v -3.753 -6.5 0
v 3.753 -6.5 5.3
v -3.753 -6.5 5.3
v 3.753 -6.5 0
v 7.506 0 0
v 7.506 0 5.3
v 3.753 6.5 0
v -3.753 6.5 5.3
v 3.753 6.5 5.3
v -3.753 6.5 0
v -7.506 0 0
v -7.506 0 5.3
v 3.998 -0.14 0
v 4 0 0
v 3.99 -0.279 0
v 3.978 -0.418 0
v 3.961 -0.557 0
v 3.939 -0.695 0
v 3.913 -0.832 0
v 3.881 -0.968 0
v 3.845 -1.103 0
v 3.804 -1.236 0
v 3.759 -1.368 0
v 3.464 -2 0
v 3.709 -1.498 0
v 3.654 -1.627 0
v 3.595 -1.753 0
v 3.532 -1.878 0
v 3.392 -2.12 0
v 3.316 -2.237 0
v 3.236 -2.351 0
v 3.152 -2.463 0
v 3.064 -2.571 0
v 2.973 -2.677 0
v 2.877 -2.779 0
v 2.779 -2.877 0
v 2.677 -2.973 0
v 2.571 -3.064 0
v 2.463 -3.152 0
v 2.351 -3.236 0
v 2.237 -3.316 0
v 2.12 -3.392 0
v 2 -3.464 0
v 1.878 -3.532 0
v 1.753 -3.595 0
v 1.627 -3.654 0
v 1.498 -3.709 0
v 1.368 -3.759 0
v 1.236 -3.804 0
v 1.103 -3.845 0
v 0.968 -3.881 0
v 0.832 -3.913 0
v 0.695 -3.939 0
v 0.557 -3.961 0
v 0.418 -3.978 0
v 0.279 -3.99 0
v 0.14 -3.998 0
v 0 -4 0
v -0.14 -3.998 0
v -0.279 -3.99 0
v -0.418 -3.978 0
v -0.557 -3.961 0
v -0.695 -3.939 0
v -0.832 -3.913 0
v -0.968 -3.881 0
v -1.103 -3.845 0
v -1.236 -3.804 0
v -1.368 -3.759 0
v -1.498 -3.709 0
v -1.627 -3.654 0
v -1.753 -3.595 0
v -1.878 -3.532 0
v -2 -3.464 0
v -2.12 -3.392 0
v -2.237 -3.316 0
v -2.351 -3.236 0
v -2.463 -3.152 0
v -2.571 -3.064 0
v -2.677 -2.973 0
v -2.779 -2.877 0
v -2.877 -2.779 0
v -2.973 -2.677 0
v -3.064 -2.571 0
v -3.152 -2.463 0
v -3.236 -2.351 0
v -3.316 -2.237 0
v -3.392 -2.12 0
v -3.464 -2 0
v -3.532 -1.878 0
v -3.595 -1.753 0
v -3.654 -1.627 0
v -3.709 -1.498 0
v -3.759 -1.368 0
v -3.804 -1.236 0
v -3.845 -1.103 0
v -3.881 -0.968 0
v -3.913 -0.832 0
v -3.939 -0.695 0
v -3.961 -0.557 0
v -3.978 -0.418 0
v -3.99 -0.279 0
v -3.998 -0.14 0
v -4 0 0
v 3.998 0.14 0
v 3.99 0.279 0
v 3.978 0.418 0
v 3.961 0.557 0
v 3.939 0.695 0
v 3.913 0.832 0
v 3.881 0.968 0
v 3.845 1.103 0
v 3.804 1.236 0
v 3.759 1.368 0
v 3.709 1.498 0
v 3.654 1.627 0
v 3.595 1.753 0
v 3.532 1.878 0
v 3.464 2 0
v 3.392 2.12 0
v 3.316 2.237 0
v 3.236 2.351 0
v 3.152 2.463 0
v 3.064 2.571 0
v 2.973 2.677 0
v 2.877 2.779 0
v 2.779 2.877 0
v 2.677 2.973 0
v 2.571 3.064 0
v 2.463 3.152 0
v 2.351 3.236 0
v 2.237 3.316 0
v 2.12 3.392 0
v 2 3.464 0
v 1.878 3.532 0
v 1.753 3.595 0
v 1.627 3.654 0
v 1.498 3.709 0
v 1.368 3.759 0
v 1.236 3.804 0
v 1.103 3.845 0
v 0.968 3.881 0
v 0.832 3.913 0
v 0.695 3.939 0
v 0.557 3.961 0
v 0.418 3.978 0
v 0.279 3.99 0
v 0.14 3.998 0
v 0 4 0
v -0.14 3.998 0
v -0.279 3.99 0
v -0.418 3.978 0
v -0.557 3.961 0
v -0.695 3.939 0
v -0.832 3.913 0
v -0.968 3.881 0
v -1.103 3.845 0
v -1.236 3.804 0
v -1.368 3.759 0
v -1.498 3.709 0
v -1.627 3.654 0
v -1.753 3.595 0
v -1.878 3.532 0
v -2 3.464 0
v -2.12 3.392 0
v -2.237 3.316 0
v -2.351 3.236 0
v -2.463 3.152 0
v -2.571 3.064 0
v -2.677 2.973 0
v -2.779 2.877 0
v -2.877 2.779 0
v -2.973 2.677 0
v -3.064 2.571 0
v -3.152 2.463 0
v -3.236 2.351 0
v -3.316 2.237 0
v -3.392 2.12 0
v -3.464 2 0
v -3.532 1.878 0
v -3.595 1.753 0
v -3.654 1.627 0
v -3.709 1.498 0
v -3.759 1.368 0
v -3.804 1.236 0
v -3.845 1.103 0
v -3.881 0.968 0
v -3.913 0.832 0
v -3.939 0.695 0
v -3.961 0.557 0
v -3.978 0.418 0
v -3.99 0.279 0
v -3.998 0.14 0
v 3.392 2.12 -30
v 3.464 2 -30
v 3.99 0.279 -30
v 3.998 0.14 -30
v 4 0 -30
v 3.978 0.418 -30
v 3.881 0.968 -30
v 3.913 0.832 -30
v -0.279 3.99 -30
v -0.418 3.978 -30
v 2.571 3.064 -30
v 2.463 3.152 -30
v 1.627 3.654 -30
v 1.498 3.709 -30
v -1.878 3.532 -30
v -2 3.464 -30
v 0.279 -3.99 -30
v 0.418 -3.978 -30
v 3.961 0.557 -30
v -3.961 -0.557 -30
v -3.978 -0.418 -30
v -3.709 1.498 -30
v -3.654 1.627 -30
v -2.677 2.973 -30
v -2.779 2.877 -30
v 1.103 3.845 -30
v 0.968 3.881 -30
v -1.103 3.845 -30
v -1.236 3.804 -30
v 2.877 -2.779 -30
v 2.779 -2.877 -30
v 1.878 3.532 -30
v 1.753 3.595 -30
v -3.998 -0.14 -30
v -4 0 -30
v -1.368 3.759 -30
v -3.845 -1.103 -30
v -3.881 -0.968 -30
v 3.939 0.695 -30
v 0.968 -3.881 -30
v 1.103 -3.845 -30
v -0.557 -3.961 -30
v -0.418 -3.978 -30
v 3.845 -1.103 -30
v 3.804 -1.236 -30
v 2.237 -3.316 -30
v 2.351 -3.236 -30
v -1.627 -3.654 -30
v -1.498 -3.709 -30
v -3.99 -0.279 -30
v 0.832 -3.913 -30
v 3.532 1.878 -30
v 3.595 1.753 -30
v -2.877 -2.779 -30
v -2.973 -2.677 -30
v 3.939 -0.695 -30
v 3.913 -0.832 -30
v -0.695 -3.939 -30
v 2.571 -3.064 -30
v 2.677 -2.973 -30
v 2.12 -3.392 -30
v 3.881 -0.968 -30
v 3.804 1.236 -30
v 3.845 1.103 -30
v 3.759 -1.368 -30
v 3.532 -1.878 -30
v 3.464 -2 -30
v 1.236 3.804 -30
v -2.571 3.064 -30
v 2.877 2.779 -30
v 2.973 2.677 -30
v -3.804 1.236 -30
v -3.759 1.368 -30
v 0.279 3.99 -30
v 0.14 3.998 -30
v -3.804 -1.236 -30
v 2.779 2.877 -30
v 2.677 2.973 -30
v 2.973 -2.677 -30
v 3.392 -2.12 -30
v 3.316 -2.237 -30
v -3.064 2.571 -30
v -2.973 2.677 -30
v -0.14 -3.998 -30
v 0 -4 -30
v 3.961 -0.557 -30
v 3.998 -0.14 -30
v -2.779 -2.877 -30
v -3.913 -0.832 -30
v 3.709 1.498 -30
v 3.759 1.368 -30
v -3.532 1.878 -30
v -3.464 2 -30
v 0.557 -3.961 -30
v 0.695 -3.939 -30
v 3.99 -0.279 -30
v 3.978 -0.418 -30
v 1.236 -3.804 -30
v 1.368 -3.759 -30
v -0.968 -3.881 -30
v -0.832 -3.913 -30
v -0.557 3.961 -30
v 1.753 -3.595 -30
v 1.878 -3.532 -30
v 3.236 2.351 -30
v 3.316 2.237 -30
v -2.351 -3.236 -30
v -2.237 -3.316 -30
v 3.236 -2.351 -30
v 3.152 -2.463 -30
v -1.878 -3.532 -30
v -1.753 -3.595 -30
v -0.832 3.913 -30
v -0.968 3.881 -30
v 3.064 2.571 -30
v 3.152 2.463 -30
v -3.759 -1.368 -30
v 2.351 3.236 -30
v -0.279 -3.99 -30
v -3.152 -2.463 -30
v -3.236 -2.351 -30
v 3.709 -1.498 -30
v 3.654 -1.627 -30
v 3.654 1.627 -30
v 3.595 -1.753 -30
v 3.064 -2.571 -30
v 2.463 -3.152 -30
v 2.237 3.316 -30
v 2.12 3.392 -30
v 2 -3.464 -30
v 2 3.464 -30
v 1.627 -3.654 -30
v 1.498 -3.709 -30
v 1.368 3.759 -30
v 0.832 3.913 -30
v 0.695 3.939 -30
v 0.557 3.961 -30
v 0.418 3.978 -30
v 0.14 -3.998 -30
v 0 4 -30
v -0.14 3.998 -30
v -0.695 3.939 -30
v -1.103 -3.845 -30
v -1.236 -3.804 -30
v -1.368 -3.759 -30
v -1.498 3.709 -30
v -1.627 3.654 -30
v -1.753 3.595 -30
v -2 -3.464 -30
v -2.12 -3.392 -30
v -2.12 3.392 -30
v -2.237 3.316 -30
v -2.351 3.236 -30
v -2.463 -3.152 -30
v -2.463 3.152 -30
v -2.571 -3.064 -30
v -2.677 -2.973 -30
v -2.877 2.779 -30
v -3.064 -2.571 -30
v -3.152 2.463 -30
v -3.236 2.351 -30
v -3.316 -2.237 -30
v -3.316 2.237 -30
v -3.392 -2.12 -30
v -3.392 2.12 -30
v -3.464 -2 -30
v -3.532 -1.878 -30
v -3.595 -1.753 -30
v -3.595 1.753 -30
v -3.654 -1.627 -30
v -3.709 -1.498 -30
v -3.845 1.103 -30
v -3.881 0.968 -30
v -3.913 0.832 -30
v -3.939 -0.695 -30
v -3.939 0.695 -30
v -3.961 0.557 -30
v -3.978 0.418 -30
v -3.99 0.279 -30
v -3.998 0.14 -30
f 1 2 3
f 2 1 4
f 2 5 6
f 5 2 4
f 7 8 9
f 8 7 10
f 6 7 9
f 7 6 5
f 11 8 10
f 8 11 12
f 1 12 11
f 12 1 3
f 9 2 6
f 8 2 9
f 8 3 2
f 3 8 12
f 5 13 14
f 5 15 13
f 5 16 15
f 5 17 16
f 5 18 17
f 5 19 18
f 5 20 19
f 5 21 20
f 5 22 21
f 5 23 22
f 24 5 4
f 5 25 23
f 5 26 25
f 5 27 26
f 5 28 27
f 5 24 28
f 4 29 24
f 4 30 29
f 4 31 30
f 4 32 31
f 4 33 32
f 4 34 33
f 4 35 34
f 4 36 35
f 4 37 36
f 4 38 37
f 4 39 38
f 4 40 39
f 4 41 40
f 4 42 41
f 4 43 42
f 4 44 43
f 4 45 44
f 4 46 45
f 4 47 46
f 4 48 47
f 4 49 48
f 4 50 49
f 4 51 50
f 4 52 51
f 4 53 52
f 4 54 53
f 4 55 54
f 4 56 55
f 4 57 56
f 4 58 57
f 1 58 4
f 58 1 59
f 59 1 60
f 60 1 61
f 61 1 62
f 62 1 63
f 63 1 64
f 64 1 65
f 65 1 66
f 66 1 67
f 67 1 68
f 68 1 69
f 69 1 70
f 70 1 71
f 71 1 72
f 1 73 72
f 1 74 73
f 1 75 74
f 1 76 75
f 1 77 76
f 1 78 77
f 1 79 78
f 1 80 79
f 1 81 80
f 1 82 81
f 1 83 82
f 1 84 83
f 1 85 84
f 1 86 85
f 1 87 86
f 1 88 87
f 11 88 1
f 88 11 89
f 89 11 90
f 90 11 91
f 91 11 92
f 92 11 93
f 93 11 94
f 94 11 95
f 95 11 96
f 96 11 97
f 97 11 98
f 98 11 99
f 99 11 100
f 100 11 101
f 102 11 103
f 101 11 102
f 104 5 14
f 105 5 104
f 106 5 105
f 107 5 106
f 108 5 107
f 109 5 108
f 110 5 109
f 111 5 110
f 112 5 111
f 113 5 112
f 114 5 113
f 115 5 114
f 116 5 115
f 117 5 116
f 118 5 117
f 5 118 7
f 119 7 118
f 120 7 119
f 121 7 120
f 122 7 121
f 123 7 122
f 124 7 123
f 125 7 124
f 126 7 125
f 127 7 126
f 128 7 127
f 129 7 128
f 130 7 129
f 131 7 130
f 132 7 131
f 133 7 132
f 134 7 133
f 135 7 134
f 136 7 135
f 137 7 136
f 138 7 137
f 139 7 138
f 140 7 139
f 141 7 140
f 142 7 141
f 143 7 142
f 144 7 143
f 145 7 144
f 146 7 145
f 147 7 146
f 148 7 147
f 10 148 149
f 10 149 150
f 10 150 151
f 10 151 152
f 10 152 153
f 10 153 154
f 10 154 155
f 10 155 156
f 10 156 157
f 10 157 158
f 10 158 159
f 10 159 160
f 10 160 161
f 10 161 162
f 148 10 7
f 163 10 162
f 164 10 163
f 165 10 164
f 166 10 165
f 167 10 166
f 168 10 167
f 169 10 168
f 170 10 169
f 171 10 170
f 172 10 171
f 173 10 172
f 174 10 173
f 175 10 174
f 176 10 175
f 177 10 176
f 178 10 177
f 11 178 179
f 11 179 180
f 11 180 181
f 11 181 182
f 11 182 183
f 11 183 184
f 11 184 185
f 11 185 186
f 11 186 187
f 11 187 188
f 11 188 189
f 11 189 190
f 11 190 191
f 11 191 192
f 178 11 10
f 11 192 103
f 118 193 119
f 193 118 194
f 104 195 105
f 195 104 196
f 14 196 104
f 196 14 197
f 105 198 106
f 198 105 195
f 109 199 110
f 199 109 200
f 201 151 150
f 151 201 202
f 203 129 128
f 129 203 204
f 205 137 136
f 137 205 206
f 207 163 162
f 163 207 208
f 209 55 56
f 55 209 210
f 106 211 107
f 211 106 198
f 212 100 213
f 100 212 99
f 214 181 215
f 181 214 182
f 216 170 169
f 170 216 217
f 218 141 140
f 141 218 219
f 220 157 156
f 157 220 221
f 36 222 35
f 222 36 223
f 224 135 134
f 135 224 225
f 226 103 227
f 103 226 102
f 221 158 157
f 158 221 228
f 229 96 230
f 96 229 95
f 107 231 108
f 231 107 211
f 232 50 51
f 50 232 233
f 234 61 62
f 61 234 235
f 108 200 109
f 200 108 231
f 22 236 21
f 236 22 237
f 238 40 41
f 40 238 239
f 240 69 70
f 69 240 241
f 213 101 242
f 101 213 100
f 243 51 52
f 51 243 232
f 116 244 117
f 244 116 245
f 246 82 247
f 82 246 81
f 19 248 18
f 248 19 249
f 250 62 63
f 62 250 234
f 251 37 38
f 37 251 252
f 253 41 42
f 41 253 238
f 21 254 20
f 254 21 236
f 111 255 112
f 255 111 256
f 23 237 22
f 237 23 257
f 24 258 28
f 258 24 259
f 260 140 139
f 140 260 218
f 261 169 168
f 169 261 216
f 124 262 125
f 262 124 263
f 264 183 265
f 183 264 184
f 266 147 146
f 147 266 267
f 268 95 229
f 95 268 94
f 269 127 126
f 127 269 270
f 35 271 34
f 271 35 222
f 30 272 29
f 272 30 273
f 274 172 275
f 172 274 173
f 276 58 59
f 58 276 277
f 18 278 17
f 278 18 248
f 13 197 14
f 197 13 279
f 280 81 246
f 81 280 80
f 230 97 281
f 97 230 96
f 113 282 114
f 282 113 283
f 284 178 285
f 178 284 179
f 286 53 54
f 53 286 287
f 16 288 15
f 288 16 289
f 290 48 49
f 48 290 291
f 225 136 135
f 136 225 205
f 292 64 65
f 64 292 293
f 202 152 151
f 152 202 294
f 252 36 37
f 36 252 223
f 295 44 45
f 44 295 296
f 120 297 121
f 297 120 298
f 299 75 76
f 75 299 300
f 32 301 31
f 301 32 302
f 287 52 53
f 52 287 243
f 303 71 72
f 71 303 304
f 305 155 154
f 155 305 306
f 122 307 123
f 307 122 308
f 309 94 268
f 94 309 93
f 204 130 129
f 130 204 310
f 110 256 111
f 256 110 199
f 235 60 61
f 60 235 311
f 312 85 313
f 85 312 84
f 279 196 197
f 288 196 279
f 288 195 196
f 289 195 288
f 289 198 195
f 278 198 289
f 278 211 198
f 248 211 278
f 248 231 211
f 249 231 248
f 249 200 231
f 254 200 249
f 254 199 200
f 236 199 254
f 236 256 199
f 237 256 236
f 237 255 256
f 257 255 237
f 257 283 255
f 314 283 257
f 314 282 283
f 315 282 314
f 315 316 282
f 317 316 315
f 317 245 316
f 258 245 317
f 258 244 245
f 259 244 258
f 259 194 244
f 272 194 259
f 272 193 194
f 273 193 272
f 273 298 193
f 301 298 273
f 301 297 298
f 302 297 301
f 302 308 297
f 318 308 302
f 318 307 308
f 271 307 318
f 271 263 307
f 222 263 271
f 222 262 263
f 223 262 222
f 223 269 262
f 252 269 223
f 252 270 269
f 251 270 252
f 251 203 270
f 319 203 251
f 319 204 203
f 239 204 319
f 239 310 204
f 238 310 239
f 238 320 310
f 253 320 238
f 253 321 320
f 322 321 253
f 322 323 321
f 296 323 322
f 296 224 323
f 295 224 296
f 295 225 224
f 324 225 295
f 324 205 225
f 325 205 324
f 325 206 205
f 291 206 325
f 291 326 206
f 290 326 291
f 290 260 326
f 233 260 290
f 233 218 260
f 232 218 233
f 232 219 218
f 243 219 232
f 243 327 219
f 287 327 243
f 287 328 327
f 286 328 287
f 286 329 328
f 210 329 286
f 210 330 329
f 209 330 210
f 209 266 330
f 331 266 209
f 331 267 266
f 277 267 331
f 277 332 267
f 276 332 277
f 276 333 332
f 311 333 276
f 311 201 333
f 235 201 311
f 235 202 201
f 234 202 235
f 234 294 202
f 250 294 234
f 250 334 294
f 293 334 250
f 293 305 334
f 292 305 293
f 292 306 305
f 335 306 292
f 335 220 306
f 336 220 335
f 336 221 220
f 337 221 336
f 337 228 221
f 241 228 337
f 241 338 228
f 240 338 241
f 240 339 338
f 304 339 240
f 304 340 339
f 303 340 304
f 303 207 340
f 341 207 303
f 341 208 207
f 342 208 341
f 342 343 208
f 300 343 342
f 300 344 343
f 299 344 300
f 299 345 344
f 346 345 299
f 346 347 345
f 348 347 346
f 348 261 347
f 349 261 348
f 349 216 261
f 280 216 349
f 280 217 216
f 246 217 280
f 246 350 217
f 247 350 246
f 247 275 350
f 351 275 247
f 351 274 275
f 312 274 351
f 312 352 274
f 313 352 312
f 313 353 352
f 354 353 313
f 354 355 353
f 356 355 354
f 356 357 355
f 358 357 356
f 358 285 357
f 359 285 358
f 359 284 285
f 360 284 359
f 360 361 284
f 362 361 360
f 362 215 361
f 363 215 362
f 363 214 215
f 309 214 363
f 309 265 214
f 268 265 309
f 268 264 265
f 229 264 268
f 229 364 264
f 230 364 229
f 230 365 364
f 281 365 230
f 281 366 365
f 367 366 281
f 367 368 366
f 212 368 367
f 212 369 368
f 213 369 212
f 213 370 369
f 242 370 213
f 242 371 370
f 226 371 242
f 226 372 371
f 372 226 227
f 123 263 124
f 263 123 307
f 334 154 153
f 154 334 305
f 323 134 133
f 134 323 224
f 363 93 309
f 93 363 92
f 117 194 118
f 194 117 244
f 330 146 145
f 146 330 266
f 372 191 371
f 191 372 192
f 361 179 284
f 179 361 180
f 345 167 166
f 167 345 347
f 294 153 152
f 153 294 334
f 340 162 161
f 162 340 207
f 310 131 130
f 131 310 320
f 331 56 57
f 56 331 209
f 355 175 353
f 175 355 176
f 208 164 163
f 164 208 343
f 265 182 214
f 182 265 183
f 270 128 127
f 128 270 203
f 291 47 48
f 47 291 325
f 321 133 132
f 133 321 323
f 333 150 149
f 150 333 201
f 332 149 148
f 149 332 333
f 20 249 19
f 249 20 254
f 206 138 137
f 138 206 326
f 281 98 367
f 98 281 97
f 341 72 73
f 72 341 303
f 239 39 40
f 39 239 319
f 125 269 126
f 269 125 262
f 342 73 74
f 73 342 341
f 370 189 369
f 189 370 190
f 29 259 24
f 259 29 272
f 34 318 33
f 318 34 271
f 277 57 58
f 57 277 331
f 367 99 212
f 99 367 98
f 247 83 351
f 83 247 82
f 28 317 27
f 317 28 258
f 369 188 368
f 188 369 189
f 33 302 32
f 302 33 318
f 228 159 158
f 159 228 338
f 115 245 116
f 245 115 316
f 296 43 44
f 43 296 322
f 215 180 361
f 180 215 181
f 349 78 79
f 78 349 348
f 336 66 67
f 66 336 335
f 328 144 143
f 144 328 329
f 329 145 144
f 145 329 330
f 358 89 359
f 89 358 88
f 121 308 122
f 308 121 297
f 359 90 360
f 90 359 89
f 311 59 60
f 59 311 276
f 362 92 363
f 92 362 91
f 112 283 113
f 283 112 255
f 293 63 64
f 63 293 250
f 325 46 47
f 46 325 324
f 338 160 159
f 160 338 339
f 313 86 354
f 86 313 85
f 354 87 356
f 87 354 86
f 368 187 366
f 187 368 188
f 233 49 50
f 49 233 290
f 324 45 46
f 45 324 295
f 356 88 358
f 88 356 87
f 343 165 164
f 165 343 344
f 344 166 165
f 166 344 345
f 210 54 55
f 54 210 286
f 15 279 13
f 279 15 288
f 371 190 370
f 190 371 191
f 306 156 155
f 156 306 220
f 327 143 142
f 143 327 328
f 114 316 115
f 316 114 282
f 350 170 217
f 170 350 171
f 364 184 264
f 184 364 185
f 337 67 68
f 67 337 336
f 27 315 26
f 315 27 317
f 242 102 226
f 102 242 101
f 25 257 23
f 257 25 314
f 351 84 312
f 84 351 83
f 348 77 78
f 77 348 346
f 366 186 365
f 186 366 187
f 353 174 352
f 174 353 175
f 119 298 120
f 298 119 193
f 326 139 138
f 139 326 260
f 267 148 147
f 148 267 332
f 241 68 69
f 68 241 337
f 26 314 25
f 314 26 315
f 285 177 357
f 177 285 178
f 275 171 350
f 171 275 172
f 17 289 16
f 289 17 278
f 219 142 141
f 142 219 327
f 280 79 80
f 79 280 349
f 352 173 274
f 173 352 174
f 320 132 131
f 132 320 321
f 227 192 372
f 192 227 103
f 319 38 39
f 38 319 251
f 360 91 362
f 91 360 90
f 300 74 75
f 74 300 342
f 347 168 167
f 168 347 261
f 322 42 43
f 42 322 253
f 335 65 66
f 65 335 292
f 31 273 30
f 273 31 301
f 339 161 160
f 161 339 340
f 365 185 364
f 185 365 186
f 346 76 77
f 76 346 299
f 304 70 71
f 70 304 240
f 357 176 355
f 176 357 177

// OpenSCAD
// M8 hex bolt (simplified thread omitted)

$fn = 180;

// Parameters
af = 13;      // across-flats for hex head (mm)
h  = 5.3;     // head height (mm)
d_shank = 8;  // shank diameter (mm)
l_shank = 30; // shank length (mm)

// Derived
r_hex = af / 2;  // circumscribed radius for a regular hex: across-flats = 2*R*cos(30)=R*sqrt(3) -> wait: use apothem
// For a regular hexagon created by polygon/cylinder with flat-to-flat = af,
// easiest: use cylinder with $fn=6; then use radius based on flat-to-flat.
// For regular hex: flat-to-flat = 2 * apothem = 2 * r*cos(30) = r*sqrt(3)
r_hex = af / sqrt(3);

union() {
    // Hex head: bottom face at z=0, center axis along +Z
    translate([0, 0, h/2])
        cylinder(h = h, r = r_hex, center = true, $fn = 6);

    // Shank: extends into z<0 side
    translate([0, 0, -l_shank/2])
        cylinder(h = l_shank, d = d_shank, center = true, $fn = 180);
}
